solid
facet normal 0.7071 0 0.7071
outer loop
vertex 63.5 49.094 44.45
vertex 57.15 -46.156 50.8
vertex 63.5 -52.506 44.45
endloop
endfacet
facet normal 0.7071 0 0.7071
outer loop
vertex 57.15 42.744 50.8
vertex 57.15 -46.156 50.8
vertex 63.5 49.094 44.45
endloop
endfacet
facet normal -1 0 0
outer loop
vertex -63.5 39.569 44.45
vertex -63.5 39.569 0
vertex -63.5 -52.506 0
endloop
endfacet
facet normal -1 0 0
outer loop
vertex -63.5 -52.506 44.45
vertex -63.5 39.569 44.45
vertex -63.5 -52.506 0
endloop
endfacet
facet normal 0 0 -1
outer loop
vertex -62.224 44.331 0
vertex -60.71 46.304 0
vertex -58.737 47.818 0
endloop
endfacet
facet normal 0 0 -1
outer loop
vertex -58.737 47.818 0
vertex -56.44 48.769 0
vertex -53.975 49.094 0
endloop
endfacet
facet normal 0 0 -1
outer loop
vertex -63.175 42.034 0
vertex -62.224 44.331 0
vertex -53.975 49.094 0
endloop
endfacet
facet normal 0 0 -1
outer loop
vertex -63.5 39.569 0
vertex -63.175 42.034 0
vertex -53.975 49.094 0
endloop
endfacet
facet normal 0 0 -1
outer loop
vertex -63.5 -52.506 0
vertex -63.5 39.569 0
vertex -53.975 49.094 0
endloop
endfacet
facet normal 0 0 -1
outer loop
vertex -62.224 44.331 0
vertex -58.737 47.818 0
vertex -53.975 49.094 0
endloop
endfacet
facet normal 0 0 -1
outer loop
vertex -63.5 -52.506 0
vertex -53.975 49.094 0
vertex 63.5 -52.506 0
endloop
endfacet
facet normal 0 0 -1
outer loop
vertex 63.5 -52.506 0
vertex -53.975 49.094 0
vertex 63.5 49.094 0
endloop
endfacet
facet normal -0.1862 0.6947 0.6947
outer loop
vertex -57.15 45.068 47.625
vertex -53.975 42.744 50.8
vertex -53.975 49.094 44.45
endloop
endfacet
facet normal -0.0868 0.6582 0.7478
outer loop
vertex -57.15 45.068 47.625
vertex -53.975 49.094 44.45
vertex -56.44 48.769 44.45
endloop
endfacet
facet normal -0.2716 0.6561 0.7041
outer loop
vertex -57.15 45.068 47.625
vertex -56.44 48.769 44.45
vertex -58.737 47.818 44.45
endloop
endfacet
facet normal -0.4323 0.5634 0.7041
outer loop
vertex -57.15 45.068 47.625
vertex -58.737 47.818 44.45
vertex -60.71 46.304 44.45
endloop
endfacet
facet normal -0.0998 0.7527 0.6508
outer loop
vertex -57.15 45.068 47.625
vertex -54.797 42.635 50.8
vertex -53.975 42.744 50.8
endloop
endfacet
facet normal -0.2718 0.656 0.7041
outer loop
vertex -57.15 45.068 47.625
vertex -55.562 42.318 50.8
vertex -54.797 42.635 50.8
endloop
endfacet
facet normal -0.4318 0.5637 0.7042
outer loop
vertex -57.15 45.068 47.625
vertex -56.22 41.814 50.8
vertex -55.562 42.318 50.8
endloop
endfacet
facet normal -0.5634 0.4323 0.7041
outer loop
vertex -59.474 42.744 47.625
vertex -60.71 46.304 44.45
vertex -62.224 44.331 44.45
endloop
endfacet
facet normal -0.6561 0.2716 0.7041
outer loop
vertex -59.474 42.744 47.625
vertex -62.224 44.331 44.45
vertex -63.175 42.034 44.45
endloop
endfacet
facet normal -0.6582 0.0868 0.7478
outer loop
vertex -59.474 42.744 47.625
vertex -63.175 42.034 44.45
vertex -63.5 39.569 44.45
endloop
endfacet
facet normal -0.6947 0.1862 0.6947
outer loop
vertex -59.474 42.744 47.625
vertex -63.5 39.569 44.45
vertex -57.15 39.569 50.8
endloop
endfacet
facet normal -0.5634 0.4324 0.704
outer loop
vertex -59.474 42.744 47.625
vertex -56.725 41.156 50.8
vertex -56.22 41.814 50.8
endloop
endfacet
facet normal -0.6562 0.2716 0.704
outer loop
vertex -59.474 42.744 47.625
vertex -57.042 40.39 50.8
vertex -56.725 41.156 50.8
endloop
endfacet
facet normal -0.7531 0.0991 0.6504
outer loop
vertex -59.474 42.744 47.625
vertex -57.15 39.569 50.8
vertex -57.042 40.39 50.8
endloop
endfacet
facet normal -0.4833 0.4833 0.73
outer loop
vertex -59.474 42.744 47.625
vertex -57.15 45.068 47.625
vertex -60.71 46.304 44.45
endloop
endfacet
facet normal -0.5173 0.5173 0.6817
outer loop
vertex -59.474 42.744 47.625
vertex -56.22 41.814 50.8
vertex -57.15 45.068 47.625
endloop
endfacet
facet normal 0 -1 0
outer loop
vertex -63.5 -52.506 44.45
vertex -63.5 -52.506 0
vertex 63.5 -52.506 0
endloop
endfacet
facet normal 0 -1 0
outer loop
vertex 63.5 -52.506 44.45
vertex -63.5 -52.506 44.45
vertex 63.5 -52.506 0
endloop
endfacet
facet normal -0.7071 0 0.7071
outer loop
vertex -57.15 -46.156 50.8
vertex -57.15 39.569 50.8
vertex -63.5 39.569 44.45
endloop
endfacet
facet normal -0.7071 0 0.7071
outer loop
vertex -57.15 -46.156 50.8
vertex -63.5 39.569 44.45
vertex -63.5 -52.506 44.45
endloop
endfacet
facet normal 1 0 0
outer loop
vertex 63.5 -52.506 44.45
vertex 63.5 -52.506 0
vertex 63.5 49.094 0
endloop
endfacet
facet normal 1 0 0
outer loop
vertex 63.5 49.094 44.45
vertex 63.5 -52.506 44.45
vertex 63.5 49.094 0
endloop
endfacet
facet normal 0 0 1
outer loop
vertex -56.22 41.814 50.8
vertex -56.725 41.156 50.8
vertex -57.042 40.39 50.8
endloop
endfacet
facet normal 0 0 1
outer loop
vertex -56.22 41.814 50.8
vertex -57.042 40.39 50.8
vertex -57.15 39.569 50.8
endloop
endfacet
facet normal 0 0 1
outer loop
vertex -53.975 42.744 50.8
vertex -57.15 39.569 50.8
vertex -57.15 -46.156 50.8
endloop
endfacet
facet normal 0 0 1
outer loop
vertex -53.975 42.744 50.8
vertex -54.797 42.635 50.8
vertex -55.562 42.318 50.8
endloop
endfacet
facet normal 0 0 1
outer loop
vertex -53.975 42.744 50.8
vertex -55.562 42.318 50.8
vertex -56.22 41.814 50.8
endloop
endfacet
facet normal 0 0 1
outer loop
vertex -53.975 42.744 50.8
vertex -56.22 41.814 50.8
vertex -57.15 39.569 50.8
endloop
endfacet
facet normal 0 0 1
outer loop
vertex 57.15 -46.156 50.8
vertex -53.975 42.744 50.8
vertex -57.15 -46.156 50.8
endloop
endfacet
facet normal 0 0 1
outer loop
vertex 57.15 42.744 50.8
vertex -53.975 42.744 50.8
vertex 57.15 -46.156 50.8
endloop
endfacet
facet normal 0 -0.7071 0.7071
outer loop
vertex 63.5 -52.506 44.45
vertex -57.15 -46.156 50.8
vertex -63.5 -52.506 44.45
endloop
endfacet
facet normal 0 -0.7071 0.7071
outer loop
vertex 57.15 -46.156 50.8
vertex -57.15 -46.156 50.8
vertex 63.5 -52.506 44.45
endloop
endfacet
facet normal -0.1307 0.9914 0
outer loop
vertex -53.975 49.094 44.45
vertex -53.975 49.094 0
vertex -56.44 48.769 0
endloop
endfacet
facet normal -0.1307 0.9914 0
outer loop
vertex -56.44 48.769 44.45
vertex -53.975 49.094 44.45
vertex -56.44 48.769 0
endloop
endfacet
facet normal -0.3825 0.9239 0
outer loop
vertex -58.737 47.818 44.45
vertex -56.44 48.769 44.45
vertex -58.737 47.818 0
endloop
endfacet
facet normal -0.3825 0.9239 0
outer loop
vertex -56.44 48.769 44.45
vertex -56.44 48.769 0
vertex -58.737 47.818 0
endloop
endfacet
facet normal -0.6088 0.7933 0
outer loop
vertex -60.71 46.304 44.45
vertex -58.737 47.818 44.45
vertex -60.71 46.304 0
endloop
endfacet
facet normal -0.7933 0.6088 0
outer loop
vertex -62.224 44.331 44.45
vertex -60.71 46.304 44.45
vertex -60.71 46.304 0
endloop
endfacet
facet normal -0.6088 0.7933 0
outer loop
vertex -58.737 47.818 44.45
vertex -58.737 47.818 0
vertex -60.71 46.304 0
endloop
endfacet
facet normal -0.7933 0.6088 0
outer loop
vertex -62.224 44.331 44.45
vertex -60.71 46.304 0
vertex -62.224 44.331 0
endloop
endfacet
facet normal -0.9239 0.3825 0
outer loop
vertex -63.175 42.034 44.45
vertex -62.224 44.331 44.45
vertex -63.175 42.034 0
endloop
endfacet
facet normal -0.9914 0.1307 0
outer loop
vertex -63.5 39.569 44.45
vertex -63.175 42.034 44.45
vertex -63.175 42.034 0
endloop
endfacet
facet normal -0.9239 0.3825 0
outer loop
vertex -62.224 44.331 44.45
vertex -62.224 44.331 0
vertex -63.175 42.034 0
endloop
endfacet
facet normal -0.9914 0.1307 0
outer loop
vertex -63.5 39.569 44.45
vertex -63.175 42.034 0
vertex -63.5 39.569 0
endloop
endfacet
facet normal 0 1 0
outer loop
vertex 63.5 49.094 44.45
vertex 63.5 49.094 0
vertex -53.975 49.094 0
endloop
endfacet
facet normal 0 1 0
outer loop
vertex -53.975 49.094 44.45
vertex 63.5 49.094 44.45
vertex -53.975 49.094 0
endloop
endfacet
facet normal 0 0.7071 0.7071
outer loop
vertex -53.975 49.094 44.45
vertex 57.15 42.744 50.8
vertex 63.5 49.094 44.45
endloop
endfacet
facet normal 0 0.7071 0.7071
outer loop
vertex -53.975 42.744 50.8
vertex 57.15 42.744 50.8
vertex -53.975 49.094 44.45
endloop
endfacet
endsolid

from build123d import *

# Parameters (mm, degrees)
F1_DEPTH = 50.8
F2_SIZE  = 6.35


with BuildPart() as f1:
    # F0 (on Top) → F1 (new body)
    with BuildSketch(Plane.XY):
        with BuildLine():
            Line((63.5, 49.093626), (-53.975, 49.093626))
            ThreePointArc((-53.975, 49.093626), (-60.710192, 46.303818), (-63.5, 39.568626))
            Line((-63.5, 39.568626), (-63.5, -52.506374))
            Line((-63.5, -52.506374), (63.5, -52.506374))
            Line((63.5, -52.506374), (63.5, 49.093626))
        make_face()
    extrude(amount=F1_DEPTH)

    # F2
    f2_edges = [f1.edges().sort_by_distance(p)[0] for p in [
        (0, -52.506374, 50.8),
        (63.5, -1.706374, 50.8),
        (4.7625, 49.093626, 50.8),
        (-60.710192, 46.303818, 50.8),
        (-63.5, -6.468874, 50.8),
    ]]
    chamfer(f2_edges, length=F2_SIZE)


solid = f1.part
